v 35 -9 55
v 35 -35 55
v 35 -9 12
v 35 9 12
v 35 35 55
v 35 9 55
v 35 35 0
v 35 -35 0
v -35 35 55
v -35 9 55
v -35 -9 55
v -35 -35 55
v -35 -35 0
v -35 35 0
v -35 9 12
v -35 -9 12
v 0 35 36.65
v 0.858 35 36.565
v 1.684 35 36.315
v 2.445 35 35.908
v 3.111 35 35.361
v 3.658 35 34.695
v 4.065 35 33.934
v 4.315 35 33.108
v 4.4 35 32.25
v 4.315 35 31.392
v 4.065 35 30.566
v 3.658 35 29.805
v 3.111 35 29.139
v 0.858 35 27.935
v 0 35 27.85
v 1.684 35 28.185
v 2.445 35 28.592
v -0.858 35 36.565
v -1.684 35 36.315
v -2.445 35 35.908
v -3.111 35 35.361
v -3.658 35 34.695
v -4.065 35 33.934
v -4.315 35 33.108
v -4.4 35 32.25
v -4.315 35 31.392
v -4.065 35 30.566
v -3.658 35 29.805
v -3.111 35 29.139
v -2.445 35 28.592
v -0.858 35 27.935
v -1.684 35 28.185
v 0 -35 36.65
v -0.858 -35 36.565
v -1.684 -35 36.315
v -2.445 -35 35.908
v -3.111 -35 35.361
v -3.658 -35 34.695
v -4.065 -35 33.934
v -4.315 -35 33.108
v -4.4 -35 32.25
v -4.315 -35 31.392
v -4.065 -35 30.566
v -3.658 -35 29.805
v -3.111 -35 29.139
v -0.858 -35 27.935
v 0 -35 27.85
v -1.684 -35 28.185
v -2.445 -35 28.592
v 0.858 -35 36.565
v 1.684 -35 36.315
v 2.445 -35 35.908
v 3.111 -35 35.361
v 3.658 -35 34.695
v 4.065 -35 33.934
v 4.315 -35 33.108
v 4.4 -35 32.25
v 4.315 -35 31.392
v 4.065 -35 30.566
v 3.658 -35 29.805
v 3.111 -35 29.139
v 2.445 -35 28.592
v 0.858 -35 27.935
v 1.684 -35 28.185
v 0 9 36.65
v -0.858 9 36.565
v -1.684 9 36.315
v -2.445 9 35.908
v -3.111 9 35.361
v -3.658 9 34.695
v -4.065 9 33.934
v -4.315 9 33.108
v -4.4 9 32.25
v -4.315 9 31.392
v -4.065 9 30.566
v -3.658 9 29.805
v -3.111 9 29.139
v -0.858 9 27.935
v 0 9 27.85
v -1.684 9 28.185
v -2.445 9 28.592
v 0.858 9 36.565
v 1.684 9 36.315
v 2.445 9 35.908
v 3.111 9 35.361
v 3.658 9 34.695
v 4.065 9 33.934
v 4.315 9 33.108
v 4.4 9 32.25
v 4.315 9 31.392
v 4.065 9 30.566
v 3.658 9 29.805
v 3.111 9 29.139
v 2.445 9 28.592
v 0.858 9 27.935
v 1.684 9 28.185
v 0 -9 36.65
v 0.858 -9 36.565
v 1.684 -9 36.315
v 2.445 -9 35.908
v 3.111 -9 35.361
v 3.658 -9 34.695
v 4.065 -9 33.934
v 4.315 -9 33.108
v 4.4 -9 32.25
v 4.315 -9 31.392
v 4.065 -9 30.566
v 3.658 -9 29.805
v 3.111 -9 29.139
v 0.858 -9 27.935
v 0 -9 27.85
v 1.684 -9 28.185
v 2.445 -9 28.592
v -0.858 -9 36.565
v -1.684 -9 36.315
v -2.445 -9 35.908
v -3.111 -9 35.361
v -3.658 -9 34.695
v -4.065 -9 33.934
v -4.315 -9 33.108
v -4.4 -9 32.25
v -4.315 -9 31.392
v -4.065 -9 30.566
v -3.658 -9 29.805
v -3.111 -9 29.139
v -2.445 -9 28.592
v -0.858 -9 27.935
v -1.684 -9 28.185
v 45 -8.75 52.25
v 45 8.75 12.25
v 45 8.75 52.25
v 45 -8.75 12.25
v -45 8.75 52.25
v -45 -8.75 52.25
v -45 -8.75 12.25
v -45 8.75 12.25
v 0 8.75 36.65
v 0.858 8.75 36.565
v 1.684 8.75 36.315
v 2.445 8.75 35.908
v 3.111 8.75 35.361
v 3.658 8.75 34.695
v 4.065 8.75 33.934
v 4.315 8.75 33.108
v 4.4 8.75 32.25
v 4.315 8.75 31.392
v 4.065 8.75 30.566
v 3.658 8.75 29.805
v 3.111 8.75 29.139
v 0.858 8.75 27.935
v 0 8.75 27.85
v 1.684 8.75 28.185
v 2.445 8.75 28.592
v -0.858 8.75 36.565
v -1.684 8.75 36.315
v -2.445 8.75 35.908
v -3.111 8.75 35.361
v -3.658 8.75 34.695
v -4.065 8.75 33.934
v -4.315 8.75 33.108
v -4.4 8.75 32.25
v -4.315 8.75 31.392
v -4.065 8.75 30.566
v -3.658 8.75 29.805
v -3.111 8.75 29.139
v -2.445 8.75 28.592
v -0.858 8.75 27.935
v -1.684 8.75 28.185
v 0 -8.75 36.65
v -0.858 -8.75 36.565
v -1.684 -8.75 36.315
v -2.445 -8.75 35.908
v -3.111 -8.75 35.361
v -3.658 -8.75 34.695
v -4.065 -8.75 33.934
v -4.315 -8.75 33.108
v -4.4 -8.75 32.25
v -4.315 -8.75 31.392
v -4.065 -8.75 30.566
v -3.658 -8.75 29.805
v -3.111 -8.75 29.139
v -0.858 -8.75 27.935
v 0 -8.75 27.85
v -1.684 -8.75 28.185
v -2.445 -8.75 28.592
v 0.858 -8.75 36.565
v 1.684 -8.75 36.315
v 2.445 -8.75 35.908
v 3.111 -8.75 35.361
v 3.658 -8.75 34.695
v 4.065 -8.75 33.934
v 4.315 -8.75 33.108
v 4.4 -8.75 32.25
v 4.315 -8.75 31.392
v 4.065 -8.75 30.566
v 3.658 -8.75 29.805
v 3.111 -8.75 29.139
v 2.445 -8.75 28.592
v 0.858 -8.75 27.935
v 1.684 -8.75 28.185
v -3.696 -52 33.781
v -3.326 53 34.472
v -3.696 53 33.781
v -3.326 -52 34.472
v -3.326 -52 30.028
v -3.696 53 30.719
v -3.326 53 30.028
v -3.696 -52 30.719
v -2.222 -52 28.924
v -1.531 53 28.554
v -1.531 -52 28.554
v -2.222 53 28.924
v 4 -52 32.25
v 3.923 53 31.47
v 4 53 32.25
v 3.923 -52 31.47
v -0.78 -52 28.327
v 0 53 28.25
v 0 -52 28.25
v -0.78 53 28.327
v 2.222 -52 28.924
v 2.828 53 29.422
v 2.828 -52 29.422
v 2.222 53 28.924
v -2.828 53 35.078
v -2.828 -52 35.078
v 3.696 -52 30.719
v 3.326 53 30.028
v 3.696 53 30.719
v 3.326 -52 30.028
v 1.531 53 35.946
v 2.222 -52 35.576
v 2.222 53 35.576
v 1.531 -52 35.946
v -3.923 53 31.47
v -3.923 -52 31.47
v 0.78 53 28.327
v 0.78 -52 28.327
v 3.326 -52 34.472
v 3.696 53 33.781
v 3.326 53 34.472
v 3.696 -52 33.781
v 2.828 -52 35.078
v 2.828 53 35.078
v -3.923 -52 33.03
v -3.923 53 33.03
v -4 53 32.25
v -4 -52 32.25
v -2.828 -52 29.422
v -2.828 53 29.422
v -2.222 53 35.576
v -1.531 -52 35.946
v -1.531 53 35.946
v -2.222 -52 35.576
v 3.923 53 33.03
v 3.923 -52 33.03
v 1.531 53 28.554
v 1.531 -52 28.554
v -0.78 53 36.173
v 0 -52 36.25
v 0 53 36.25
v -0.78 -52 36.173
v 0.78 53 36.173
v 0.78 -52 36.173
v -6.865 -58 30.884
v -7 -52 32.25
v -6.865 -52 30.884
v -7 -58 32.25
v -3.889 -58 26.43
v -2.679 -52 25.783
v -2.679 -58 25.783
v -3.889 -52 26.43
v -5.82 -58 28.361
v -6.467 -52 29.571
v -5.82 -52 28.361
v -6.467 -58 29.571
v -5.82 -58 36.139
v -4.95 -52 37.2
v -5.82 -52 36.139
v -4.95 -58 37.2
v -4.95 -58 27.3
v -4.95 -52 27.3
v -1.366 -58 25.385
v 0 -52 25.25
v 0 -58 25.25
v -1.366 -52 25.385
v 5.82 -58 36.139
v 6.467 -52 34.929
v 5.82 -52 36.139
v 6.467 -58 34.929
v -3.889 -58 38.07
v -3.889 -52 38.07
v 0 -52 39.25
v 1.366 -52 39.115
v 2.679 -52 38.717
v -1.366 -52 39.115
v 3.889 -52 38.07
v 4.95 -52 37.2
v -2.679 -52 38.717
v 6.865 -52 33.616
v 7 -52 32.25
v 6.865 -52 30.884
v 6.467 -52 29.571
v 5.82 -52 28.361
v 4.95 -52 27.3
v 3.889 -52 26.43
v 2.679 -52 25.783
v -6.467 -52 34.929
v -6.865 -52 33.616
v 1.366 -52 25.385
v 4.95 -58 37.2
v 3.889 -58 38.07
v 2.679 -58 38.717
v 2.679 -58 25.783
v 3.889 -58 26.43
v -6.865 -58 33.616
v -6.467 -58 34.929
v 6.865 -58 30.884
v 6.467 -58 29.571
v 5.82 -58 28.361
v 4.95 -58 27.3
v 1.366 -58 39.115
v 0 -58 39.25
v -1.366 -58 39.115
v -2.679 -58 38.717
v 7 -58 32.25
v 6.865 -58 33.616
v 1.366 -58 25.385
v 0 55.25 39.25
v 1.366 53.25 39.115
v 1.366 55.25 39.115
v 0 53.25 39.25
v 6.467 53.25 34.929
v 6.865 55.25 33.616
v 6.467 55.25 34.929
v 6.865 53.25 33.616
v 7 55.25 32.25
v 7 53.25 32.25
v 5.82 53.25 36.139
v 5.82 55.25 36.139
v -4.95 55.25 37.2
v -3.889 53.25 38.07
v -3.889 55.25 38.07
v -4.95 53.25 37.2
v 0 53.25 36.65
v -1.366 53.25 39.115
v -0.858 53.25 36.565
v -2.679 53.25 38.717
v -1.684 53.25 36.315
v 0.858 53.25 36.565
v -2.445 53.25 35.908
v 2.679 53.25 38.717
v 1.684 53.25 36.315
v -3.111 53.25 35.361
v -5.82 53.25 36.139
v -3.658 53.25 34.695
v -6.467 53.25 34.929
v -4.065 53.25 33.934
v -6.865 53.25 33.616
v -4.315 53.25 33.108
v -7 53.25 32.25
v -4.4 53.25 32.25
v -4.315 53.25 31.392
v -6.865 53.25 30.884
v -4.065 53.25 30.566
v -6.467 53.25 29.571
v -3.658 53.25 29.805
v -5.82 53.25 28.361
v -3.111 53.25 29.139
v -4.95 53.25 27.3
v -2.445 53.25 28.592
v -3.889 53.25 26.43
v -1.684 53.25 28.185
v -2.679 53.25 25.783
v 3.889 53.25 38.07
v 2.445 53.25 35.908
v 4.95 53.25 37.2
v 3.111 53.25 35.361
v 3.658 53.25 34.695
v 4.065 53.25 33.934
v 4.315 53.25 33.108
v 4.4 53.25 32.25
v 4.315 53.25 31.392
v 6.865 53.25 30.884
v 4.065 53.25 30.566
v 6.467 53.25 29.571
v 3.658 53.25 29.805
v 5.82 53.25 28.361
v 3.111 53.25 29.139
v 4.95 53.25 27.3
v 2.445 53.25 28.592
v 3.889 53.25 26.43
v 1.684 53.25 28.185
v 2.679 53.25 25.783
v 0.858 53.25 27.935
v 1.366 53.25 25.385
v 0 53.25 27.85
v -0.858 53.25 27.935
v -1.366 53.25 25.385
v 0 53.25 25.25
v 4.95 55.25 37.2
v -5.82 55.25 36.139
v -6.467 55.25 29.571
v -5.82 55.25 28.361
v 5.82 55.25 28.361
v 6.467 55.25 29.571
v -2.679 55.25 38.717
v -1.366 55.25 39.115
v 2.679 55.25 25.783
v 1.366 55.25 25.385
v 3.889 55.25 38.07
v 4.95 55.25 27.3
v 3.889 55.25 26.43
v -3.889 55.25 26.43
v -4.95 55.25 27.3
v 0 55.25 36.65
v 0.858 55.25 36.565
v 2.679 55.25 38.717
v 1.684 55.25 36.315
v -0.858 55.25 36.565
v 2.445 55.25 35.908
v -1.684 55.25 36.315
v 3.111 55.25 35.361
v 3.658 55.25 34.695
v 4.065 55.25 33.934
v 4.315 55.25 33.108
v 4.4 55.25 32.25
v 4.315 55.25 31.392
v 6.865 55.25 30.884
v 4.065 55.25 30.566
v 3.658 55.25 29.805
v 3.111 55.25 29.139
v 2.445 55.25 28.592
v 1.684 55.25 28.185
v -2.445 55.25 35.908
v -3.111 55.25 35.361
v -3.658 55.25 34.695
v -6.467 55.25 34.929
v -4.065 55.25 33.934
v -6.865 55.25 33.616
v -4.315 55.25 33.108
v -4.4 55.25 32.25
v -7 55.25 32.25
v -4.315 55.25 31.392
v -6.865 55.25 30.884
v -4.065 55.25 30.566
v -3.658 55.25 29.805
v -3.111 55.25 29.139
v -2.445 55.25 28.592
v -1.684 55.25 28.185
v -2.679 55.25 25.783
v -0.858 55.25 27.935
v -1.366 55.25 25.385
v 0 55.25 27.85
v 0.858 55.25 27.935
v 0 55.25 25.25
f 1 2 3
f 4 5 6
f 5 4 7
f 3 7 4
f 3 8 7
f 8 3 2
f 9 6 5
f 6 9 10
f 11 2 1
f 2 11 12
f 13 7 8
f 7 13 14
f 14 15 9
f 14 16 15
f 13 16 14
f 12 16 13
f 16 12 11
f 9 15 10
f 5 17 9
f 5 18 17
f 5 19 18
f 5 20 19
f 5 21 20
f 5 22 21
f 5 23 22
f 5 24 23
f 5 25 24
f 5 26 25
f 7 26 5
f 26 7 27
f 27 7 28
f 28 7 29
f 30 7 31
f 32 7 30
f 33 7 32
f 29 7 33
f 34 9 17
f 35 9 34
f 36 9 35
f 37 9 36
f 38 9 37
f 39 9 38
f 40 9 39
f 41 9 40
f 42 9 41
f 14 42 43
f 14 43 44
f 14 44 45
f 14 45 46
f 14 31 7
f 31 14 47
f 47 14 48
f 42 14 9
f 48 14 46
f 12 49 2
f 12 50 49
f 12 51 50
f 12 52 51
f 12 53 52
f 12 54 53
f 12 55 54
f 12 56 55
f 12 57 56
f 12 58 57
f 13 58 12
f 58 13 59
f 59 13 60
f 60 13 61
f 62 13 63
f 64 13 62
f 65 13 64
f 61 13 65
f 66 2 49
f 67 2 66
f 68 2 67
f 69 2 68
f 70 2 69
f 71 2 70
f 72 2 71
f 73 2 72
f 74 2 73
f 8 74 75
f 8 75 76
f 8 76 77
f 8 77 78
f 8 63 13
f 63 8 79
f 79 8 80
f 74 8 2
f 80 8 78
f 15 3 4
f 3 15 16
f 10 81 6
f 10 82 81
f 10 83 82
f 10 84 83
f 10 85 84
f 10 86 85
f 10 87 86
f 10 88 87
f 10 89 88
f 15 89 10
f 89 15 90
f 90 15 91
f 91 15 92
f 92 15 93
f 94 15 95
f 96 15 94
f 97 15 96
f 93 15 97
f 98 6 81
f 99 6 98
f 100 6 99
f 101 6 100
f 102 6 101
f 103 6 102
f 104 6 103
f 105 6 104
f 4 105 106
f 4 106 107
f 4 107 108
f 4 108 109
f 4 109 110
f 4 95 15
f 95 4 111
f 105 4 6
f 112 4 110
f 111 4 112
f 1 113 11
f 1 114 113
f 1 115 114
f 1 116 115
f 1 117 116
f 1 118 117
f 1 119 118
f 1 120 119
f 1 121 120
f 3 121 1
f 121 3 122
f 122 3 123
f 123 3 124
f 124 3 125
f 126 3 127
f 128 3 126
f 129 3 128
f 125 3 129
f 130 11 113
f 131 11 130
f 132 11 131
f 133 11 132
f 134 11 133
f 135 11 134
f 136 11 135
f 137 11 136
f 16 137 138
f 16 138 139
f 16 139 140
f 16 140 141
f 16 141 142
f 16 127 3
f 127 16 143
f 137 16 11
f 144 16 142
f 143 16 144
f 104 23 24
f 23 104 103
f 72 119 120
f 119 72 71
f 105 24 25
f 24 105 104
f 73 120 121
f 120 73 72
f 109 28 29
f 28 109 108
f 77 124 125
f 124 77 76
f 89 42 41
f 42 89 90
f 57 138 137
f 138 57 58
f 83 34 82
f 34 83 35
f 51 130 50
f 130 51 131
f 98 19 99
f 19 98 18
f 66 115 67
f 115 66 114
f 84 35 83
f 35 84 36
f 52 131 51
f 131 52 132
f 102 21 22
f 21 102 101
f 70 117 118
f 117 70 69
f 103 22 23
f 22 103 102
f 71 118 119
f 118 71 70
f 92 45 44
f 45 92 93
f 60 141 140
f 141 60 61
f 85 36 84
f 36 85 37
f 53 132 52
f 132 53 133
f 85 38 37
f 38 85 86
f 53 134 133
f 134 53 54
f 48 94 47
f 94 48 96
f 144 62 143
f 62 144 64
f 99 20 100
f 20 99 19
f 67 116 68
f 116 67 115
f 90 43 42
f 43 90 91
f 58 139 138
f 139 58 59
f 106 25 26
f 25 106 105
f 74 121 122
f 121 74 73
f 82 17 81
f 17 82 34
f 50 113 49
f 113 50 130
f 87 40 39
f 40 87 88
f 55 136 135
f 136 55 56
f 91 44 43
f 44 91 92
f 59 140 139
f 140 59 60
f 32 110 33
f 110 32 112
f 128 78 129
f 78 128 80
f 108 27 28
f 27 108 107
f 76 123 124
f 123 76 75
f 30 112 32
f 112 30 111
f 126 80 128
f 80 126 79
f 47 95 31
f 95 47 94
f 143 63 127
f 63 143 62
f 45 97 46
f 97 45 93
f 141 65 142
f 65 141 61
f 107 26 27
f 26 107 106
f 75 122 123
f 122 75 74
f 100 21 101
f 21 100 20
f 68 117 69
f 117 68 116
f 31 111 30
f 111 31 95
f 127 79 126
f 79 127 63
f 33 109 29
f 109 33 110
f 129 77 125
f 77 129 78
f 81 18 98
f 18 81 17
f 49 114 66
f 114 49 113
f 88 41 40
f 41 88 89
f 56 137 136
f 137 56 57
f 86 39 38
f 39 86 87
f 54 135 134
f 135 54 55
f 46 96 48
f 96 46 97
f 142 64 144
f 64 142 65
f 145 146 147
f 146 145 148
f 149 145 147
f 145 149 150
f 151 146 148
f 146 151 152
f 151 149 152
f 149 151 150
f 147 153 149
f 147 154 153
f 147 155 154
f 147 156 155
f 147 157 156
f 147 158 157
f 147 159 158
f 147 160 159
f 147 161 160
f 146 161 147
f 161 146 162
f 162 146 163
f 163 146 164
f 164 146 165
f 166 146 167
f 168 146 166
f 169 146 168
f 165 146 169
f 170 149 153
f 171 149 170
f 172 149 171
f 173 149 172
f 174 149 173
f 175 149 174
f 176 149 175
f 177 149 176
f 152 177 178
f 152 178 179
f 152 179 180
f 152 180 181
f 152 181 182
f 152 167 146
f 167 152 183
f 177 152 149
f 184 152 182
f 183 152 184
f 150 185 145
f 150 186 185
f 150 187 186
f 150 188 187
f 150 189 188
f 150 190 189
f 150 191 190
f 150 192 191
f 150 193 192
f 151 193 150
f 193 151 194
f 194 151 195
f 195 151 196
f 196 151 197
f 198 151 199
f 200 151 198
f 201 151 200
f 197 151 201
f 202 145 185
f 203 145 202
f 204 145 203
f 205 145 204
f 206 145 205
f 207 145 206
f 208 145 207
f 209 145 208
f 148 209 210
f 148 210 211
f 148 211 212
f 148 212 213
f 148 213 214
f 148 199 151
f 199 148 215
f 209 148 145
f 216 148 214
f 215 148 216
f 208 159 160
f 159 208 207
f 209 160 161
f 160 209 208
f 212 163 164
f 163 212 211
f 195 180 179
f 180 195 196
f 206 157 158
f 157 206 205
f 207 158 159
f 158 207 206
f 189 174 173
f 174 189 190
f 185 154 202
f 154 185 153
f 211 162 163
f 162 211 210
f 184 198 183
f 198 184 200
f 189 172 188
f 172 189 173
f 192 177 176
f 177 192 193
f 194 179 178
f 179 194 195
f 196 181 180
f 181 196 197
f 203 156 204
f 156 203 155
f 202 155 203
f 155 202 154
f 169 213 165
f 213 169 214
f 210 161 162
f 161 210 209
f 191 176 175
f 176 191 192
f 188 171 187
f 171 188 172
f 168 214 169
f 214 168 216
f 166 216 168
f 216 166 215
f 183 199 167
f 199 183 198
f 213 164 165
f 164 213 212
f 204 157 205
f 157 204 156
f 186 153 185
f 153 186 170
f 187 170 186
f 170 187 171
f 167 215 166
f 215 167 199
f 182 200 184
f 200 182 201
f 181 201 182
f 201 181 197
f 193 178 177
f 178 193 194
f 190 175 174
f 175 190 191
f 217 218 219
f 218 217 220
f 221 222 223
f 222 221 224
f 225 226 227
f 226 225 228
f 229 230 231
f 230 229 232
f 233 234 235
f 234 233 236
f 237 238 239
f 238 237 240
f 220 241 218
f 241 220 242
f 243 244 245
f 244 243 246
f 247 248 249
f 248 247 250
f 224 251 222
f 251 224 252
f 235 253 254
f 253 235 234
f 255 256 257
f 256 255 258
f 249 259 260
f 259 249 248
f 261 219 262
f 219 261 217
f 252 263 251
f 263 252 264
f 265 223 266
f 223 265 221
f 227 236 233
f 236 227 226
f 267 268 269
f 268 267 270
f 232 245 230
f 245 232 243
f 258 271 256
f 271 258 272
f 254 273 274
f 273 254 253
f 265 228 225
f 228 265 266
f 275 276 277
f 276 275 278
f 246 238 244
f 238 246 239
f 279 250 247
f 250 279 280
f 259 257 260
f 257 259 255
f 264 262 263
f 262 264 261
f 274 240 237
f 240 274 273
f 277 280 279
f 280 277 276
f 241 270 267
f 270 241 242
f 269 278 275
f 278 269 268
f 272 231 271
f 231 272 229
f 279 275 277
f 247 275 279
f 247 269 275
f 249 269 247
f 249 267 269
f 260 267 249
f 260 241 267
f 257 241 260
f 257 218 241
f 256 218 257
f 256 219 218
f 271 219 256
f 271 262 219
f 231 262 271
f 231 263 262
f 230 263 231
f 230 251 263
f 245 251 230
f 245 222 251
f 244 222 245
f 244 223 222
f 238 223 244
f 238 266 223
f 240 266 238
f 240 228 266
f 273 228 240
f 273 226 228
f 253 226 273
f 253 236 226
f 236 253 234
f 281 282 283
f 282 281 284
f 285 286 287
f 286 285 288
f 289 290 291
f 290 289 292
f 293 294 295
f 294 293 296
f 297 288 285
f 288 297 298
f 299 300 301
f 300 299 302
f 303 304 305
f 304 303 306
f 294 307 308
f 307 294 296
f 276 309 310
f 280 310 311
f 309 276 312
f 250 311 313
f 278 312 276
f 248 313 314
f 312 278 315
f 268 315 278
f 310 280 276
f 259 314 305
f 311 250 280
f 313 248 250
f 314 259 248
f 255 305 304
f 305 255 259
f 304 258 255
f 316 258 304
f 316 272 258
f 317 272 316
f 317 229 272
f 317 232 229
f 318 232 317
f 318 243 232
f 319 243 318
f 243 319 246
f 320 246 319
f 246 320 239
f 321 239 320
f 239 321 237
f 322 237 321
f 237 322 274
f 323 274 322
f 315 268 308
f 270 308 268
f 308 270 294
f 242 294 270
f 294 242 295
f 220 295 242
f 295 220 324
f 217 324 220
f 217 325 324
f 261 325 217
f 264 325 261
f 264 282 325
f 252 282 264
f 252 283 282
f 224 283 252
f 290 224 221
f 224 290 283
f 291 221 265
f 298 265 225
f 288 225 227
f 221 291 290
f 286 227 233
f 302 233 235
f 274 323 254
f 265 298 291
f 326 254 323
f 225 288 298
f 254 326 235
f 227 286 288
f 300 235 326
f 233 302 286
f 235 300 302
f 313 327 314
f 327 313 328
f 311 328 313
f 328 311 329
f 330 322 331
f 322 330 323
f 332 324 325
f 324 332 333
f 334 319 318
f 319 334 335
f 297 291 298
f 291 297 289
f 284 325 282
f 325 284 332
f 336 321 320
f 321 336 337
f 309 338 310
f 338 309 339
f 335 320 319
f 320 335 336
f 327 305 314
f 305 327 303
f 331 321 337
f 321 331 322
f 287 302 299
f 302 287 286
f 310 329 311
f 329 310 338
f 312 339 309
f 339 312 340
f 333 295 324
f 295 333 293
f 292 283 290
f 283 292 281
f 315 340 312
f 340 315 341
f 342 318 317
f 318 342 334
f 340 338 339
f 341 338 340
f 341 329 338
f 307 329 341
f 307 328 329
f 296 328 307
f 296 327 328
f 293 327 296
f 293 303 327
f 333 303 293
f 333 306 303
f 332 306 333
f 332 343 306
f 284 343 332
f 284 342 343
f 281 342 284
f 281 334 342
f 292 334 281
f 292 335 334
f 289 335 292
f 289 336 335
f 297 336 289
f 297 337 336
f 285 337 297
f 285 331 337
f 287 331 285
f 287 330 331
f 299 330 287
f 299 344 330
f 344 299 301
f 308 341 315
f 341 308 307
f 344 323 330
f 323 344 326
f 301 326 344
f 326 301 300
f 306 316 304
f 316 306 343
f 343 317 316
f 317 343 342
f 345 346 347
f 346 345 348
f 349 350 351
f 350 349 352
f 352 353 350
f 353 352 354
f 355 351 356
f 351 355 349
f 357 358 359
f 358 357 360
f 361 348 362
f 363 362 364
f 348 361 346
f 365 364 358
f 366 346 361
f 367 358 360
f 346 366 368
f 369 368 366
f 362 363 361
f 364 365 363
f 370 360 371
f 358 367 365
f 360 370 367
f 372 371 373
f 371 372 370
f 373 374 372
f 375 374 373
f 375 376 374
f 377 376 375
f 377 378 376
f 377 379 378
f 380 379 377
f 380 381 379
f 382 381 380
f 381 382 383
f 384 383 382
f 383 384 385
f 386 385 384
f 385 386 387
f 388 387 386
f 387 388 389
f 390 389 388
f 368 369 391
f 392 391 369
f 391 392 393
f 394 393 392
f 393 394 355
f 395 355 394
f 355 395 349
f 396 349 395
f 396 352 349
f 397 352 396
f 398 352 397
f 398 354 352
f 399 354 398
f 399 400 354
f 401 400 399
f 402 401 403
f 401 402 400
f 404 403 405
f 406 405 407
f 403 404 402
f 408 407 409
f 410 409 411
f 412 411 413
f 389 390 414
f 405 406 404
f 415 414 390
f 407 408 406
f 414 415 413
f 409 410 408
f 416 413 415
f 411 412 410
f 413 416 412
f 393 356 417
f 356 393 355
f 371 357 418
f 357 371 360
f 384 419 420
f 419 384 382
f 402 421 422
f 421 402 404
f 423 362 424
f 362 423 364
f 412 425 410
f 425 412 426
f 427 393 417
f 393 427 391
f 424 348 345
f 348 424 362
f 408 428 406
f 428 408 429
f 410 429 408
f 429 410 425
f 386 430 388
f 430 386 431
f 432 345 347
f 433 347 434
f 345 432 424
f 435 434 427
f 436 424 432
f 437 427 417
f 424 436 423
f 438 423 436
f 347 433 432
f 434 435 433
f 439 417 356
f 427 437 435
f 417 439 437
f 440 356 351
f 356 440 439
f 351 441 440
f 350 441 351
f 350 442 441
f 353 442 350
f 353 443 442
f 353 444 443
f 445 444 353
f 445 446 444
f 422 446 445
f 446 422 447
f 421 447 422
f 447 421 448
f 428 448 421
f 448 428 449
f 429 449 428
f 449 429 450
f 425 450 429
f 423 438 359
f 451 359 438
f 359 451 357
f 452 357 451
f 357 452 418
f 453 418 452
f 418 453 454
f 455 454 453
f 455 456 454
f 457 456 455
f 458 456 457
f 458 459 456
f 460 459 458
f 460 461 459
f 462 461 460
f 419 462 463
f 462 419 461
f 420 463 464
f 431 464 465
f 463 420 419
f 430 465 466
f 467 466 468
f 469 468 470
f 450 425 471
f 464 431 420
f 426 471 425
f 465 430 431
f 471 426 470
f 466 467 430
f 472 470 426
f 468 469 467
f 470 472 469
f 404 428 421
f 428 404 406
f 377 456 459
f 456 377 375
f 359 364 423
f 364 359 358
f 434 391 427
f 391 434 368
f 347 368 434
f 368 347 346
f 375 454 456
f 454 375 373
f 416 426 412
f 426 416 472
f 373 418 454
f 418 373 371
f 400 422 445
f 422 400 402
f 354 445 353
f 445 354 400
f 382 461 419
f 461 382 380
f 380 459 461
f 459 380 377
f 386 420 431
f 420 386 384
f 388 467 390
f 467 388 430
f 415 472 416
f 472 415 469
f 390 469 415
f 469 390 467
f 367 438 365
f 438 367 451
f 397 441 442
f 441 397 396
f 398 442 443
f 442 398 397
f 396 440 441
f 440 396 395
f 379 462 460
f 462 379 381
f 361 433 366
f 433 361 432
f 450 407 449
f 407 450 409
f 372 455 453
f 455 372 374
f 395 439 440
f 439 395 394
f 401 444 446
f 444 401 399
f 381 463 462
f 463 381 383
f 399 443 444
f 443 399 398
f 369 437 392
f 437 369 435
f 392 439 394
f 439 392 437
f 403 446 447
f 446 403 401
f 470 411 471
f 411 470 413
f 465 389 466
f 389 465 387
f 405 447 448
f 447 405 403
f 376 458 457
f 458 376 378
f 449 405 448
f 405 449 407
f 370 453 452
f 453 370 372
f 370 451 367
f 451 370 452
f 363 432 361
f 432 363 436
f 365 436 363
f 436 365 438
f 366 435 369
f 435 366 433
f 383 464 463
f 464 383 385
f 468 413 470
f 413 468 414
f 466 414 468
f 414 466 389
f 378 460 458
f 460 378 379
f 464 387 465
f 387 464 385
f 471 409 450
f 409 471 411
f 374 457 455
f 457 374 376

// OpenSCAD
$fn = 32;

// ------------------------------------------------------------------------
// Clevis joint: 70 mm clevis, pin d8
// Every part is its own module, assembly() places them once.
// ------------------------------------------------------------------------

// --- part 1 ---
module clevis() {
  difference() {
    translate([-35, -35, 0]) cube([70, 70, 55]);
    translate([-36, -9, 12]) cube([72, 18, 44]);
    translate([0, 0, 32.25]) rotate([90, 0, 0]) cylinder(h = 72, d = 8.8, center = true);
  }
}

// --- part 2 ---
module eye() {
  difference() {
    translate([-45, -8.75, 0]) cube([90, 17.5, 40]);
    translate([0, 0, 20]) rotate([90, 0, 0]) cylinder(h = 19.5, d = 8.8, center = true);
  }
}

// --- part 3 ---
module pin() {
  rotate([0, 90, 0]) cylinder(h = 106, d = 8, center = true);
  translate([-58, 0, 0]) rotate([0, 90, 0]) cylinder(h = 6, d = 14);
}

// --- part 4 ---
module retainer() {
  difference() {
      translate([0, 0, 0]) cylinder(h = 2, d = 14);
      translate([0, 0, -1]) cylinder(h = 4, d = 8.8);
    }
}

// --- assembly ---
module assembly() {
  translate([0, 0, 0]) rotate([0, 0, 0]) clevis();
  translate([0, 0, 12.25]) rotate([0, 0, 0]) eye();
  translate([0, 0, 32.25]) rotate([0, 0, 90]) pin();
  translate([0, 55.25, 32.25]) rotate([90, 0, 0]) retainer();
}

assembly();
